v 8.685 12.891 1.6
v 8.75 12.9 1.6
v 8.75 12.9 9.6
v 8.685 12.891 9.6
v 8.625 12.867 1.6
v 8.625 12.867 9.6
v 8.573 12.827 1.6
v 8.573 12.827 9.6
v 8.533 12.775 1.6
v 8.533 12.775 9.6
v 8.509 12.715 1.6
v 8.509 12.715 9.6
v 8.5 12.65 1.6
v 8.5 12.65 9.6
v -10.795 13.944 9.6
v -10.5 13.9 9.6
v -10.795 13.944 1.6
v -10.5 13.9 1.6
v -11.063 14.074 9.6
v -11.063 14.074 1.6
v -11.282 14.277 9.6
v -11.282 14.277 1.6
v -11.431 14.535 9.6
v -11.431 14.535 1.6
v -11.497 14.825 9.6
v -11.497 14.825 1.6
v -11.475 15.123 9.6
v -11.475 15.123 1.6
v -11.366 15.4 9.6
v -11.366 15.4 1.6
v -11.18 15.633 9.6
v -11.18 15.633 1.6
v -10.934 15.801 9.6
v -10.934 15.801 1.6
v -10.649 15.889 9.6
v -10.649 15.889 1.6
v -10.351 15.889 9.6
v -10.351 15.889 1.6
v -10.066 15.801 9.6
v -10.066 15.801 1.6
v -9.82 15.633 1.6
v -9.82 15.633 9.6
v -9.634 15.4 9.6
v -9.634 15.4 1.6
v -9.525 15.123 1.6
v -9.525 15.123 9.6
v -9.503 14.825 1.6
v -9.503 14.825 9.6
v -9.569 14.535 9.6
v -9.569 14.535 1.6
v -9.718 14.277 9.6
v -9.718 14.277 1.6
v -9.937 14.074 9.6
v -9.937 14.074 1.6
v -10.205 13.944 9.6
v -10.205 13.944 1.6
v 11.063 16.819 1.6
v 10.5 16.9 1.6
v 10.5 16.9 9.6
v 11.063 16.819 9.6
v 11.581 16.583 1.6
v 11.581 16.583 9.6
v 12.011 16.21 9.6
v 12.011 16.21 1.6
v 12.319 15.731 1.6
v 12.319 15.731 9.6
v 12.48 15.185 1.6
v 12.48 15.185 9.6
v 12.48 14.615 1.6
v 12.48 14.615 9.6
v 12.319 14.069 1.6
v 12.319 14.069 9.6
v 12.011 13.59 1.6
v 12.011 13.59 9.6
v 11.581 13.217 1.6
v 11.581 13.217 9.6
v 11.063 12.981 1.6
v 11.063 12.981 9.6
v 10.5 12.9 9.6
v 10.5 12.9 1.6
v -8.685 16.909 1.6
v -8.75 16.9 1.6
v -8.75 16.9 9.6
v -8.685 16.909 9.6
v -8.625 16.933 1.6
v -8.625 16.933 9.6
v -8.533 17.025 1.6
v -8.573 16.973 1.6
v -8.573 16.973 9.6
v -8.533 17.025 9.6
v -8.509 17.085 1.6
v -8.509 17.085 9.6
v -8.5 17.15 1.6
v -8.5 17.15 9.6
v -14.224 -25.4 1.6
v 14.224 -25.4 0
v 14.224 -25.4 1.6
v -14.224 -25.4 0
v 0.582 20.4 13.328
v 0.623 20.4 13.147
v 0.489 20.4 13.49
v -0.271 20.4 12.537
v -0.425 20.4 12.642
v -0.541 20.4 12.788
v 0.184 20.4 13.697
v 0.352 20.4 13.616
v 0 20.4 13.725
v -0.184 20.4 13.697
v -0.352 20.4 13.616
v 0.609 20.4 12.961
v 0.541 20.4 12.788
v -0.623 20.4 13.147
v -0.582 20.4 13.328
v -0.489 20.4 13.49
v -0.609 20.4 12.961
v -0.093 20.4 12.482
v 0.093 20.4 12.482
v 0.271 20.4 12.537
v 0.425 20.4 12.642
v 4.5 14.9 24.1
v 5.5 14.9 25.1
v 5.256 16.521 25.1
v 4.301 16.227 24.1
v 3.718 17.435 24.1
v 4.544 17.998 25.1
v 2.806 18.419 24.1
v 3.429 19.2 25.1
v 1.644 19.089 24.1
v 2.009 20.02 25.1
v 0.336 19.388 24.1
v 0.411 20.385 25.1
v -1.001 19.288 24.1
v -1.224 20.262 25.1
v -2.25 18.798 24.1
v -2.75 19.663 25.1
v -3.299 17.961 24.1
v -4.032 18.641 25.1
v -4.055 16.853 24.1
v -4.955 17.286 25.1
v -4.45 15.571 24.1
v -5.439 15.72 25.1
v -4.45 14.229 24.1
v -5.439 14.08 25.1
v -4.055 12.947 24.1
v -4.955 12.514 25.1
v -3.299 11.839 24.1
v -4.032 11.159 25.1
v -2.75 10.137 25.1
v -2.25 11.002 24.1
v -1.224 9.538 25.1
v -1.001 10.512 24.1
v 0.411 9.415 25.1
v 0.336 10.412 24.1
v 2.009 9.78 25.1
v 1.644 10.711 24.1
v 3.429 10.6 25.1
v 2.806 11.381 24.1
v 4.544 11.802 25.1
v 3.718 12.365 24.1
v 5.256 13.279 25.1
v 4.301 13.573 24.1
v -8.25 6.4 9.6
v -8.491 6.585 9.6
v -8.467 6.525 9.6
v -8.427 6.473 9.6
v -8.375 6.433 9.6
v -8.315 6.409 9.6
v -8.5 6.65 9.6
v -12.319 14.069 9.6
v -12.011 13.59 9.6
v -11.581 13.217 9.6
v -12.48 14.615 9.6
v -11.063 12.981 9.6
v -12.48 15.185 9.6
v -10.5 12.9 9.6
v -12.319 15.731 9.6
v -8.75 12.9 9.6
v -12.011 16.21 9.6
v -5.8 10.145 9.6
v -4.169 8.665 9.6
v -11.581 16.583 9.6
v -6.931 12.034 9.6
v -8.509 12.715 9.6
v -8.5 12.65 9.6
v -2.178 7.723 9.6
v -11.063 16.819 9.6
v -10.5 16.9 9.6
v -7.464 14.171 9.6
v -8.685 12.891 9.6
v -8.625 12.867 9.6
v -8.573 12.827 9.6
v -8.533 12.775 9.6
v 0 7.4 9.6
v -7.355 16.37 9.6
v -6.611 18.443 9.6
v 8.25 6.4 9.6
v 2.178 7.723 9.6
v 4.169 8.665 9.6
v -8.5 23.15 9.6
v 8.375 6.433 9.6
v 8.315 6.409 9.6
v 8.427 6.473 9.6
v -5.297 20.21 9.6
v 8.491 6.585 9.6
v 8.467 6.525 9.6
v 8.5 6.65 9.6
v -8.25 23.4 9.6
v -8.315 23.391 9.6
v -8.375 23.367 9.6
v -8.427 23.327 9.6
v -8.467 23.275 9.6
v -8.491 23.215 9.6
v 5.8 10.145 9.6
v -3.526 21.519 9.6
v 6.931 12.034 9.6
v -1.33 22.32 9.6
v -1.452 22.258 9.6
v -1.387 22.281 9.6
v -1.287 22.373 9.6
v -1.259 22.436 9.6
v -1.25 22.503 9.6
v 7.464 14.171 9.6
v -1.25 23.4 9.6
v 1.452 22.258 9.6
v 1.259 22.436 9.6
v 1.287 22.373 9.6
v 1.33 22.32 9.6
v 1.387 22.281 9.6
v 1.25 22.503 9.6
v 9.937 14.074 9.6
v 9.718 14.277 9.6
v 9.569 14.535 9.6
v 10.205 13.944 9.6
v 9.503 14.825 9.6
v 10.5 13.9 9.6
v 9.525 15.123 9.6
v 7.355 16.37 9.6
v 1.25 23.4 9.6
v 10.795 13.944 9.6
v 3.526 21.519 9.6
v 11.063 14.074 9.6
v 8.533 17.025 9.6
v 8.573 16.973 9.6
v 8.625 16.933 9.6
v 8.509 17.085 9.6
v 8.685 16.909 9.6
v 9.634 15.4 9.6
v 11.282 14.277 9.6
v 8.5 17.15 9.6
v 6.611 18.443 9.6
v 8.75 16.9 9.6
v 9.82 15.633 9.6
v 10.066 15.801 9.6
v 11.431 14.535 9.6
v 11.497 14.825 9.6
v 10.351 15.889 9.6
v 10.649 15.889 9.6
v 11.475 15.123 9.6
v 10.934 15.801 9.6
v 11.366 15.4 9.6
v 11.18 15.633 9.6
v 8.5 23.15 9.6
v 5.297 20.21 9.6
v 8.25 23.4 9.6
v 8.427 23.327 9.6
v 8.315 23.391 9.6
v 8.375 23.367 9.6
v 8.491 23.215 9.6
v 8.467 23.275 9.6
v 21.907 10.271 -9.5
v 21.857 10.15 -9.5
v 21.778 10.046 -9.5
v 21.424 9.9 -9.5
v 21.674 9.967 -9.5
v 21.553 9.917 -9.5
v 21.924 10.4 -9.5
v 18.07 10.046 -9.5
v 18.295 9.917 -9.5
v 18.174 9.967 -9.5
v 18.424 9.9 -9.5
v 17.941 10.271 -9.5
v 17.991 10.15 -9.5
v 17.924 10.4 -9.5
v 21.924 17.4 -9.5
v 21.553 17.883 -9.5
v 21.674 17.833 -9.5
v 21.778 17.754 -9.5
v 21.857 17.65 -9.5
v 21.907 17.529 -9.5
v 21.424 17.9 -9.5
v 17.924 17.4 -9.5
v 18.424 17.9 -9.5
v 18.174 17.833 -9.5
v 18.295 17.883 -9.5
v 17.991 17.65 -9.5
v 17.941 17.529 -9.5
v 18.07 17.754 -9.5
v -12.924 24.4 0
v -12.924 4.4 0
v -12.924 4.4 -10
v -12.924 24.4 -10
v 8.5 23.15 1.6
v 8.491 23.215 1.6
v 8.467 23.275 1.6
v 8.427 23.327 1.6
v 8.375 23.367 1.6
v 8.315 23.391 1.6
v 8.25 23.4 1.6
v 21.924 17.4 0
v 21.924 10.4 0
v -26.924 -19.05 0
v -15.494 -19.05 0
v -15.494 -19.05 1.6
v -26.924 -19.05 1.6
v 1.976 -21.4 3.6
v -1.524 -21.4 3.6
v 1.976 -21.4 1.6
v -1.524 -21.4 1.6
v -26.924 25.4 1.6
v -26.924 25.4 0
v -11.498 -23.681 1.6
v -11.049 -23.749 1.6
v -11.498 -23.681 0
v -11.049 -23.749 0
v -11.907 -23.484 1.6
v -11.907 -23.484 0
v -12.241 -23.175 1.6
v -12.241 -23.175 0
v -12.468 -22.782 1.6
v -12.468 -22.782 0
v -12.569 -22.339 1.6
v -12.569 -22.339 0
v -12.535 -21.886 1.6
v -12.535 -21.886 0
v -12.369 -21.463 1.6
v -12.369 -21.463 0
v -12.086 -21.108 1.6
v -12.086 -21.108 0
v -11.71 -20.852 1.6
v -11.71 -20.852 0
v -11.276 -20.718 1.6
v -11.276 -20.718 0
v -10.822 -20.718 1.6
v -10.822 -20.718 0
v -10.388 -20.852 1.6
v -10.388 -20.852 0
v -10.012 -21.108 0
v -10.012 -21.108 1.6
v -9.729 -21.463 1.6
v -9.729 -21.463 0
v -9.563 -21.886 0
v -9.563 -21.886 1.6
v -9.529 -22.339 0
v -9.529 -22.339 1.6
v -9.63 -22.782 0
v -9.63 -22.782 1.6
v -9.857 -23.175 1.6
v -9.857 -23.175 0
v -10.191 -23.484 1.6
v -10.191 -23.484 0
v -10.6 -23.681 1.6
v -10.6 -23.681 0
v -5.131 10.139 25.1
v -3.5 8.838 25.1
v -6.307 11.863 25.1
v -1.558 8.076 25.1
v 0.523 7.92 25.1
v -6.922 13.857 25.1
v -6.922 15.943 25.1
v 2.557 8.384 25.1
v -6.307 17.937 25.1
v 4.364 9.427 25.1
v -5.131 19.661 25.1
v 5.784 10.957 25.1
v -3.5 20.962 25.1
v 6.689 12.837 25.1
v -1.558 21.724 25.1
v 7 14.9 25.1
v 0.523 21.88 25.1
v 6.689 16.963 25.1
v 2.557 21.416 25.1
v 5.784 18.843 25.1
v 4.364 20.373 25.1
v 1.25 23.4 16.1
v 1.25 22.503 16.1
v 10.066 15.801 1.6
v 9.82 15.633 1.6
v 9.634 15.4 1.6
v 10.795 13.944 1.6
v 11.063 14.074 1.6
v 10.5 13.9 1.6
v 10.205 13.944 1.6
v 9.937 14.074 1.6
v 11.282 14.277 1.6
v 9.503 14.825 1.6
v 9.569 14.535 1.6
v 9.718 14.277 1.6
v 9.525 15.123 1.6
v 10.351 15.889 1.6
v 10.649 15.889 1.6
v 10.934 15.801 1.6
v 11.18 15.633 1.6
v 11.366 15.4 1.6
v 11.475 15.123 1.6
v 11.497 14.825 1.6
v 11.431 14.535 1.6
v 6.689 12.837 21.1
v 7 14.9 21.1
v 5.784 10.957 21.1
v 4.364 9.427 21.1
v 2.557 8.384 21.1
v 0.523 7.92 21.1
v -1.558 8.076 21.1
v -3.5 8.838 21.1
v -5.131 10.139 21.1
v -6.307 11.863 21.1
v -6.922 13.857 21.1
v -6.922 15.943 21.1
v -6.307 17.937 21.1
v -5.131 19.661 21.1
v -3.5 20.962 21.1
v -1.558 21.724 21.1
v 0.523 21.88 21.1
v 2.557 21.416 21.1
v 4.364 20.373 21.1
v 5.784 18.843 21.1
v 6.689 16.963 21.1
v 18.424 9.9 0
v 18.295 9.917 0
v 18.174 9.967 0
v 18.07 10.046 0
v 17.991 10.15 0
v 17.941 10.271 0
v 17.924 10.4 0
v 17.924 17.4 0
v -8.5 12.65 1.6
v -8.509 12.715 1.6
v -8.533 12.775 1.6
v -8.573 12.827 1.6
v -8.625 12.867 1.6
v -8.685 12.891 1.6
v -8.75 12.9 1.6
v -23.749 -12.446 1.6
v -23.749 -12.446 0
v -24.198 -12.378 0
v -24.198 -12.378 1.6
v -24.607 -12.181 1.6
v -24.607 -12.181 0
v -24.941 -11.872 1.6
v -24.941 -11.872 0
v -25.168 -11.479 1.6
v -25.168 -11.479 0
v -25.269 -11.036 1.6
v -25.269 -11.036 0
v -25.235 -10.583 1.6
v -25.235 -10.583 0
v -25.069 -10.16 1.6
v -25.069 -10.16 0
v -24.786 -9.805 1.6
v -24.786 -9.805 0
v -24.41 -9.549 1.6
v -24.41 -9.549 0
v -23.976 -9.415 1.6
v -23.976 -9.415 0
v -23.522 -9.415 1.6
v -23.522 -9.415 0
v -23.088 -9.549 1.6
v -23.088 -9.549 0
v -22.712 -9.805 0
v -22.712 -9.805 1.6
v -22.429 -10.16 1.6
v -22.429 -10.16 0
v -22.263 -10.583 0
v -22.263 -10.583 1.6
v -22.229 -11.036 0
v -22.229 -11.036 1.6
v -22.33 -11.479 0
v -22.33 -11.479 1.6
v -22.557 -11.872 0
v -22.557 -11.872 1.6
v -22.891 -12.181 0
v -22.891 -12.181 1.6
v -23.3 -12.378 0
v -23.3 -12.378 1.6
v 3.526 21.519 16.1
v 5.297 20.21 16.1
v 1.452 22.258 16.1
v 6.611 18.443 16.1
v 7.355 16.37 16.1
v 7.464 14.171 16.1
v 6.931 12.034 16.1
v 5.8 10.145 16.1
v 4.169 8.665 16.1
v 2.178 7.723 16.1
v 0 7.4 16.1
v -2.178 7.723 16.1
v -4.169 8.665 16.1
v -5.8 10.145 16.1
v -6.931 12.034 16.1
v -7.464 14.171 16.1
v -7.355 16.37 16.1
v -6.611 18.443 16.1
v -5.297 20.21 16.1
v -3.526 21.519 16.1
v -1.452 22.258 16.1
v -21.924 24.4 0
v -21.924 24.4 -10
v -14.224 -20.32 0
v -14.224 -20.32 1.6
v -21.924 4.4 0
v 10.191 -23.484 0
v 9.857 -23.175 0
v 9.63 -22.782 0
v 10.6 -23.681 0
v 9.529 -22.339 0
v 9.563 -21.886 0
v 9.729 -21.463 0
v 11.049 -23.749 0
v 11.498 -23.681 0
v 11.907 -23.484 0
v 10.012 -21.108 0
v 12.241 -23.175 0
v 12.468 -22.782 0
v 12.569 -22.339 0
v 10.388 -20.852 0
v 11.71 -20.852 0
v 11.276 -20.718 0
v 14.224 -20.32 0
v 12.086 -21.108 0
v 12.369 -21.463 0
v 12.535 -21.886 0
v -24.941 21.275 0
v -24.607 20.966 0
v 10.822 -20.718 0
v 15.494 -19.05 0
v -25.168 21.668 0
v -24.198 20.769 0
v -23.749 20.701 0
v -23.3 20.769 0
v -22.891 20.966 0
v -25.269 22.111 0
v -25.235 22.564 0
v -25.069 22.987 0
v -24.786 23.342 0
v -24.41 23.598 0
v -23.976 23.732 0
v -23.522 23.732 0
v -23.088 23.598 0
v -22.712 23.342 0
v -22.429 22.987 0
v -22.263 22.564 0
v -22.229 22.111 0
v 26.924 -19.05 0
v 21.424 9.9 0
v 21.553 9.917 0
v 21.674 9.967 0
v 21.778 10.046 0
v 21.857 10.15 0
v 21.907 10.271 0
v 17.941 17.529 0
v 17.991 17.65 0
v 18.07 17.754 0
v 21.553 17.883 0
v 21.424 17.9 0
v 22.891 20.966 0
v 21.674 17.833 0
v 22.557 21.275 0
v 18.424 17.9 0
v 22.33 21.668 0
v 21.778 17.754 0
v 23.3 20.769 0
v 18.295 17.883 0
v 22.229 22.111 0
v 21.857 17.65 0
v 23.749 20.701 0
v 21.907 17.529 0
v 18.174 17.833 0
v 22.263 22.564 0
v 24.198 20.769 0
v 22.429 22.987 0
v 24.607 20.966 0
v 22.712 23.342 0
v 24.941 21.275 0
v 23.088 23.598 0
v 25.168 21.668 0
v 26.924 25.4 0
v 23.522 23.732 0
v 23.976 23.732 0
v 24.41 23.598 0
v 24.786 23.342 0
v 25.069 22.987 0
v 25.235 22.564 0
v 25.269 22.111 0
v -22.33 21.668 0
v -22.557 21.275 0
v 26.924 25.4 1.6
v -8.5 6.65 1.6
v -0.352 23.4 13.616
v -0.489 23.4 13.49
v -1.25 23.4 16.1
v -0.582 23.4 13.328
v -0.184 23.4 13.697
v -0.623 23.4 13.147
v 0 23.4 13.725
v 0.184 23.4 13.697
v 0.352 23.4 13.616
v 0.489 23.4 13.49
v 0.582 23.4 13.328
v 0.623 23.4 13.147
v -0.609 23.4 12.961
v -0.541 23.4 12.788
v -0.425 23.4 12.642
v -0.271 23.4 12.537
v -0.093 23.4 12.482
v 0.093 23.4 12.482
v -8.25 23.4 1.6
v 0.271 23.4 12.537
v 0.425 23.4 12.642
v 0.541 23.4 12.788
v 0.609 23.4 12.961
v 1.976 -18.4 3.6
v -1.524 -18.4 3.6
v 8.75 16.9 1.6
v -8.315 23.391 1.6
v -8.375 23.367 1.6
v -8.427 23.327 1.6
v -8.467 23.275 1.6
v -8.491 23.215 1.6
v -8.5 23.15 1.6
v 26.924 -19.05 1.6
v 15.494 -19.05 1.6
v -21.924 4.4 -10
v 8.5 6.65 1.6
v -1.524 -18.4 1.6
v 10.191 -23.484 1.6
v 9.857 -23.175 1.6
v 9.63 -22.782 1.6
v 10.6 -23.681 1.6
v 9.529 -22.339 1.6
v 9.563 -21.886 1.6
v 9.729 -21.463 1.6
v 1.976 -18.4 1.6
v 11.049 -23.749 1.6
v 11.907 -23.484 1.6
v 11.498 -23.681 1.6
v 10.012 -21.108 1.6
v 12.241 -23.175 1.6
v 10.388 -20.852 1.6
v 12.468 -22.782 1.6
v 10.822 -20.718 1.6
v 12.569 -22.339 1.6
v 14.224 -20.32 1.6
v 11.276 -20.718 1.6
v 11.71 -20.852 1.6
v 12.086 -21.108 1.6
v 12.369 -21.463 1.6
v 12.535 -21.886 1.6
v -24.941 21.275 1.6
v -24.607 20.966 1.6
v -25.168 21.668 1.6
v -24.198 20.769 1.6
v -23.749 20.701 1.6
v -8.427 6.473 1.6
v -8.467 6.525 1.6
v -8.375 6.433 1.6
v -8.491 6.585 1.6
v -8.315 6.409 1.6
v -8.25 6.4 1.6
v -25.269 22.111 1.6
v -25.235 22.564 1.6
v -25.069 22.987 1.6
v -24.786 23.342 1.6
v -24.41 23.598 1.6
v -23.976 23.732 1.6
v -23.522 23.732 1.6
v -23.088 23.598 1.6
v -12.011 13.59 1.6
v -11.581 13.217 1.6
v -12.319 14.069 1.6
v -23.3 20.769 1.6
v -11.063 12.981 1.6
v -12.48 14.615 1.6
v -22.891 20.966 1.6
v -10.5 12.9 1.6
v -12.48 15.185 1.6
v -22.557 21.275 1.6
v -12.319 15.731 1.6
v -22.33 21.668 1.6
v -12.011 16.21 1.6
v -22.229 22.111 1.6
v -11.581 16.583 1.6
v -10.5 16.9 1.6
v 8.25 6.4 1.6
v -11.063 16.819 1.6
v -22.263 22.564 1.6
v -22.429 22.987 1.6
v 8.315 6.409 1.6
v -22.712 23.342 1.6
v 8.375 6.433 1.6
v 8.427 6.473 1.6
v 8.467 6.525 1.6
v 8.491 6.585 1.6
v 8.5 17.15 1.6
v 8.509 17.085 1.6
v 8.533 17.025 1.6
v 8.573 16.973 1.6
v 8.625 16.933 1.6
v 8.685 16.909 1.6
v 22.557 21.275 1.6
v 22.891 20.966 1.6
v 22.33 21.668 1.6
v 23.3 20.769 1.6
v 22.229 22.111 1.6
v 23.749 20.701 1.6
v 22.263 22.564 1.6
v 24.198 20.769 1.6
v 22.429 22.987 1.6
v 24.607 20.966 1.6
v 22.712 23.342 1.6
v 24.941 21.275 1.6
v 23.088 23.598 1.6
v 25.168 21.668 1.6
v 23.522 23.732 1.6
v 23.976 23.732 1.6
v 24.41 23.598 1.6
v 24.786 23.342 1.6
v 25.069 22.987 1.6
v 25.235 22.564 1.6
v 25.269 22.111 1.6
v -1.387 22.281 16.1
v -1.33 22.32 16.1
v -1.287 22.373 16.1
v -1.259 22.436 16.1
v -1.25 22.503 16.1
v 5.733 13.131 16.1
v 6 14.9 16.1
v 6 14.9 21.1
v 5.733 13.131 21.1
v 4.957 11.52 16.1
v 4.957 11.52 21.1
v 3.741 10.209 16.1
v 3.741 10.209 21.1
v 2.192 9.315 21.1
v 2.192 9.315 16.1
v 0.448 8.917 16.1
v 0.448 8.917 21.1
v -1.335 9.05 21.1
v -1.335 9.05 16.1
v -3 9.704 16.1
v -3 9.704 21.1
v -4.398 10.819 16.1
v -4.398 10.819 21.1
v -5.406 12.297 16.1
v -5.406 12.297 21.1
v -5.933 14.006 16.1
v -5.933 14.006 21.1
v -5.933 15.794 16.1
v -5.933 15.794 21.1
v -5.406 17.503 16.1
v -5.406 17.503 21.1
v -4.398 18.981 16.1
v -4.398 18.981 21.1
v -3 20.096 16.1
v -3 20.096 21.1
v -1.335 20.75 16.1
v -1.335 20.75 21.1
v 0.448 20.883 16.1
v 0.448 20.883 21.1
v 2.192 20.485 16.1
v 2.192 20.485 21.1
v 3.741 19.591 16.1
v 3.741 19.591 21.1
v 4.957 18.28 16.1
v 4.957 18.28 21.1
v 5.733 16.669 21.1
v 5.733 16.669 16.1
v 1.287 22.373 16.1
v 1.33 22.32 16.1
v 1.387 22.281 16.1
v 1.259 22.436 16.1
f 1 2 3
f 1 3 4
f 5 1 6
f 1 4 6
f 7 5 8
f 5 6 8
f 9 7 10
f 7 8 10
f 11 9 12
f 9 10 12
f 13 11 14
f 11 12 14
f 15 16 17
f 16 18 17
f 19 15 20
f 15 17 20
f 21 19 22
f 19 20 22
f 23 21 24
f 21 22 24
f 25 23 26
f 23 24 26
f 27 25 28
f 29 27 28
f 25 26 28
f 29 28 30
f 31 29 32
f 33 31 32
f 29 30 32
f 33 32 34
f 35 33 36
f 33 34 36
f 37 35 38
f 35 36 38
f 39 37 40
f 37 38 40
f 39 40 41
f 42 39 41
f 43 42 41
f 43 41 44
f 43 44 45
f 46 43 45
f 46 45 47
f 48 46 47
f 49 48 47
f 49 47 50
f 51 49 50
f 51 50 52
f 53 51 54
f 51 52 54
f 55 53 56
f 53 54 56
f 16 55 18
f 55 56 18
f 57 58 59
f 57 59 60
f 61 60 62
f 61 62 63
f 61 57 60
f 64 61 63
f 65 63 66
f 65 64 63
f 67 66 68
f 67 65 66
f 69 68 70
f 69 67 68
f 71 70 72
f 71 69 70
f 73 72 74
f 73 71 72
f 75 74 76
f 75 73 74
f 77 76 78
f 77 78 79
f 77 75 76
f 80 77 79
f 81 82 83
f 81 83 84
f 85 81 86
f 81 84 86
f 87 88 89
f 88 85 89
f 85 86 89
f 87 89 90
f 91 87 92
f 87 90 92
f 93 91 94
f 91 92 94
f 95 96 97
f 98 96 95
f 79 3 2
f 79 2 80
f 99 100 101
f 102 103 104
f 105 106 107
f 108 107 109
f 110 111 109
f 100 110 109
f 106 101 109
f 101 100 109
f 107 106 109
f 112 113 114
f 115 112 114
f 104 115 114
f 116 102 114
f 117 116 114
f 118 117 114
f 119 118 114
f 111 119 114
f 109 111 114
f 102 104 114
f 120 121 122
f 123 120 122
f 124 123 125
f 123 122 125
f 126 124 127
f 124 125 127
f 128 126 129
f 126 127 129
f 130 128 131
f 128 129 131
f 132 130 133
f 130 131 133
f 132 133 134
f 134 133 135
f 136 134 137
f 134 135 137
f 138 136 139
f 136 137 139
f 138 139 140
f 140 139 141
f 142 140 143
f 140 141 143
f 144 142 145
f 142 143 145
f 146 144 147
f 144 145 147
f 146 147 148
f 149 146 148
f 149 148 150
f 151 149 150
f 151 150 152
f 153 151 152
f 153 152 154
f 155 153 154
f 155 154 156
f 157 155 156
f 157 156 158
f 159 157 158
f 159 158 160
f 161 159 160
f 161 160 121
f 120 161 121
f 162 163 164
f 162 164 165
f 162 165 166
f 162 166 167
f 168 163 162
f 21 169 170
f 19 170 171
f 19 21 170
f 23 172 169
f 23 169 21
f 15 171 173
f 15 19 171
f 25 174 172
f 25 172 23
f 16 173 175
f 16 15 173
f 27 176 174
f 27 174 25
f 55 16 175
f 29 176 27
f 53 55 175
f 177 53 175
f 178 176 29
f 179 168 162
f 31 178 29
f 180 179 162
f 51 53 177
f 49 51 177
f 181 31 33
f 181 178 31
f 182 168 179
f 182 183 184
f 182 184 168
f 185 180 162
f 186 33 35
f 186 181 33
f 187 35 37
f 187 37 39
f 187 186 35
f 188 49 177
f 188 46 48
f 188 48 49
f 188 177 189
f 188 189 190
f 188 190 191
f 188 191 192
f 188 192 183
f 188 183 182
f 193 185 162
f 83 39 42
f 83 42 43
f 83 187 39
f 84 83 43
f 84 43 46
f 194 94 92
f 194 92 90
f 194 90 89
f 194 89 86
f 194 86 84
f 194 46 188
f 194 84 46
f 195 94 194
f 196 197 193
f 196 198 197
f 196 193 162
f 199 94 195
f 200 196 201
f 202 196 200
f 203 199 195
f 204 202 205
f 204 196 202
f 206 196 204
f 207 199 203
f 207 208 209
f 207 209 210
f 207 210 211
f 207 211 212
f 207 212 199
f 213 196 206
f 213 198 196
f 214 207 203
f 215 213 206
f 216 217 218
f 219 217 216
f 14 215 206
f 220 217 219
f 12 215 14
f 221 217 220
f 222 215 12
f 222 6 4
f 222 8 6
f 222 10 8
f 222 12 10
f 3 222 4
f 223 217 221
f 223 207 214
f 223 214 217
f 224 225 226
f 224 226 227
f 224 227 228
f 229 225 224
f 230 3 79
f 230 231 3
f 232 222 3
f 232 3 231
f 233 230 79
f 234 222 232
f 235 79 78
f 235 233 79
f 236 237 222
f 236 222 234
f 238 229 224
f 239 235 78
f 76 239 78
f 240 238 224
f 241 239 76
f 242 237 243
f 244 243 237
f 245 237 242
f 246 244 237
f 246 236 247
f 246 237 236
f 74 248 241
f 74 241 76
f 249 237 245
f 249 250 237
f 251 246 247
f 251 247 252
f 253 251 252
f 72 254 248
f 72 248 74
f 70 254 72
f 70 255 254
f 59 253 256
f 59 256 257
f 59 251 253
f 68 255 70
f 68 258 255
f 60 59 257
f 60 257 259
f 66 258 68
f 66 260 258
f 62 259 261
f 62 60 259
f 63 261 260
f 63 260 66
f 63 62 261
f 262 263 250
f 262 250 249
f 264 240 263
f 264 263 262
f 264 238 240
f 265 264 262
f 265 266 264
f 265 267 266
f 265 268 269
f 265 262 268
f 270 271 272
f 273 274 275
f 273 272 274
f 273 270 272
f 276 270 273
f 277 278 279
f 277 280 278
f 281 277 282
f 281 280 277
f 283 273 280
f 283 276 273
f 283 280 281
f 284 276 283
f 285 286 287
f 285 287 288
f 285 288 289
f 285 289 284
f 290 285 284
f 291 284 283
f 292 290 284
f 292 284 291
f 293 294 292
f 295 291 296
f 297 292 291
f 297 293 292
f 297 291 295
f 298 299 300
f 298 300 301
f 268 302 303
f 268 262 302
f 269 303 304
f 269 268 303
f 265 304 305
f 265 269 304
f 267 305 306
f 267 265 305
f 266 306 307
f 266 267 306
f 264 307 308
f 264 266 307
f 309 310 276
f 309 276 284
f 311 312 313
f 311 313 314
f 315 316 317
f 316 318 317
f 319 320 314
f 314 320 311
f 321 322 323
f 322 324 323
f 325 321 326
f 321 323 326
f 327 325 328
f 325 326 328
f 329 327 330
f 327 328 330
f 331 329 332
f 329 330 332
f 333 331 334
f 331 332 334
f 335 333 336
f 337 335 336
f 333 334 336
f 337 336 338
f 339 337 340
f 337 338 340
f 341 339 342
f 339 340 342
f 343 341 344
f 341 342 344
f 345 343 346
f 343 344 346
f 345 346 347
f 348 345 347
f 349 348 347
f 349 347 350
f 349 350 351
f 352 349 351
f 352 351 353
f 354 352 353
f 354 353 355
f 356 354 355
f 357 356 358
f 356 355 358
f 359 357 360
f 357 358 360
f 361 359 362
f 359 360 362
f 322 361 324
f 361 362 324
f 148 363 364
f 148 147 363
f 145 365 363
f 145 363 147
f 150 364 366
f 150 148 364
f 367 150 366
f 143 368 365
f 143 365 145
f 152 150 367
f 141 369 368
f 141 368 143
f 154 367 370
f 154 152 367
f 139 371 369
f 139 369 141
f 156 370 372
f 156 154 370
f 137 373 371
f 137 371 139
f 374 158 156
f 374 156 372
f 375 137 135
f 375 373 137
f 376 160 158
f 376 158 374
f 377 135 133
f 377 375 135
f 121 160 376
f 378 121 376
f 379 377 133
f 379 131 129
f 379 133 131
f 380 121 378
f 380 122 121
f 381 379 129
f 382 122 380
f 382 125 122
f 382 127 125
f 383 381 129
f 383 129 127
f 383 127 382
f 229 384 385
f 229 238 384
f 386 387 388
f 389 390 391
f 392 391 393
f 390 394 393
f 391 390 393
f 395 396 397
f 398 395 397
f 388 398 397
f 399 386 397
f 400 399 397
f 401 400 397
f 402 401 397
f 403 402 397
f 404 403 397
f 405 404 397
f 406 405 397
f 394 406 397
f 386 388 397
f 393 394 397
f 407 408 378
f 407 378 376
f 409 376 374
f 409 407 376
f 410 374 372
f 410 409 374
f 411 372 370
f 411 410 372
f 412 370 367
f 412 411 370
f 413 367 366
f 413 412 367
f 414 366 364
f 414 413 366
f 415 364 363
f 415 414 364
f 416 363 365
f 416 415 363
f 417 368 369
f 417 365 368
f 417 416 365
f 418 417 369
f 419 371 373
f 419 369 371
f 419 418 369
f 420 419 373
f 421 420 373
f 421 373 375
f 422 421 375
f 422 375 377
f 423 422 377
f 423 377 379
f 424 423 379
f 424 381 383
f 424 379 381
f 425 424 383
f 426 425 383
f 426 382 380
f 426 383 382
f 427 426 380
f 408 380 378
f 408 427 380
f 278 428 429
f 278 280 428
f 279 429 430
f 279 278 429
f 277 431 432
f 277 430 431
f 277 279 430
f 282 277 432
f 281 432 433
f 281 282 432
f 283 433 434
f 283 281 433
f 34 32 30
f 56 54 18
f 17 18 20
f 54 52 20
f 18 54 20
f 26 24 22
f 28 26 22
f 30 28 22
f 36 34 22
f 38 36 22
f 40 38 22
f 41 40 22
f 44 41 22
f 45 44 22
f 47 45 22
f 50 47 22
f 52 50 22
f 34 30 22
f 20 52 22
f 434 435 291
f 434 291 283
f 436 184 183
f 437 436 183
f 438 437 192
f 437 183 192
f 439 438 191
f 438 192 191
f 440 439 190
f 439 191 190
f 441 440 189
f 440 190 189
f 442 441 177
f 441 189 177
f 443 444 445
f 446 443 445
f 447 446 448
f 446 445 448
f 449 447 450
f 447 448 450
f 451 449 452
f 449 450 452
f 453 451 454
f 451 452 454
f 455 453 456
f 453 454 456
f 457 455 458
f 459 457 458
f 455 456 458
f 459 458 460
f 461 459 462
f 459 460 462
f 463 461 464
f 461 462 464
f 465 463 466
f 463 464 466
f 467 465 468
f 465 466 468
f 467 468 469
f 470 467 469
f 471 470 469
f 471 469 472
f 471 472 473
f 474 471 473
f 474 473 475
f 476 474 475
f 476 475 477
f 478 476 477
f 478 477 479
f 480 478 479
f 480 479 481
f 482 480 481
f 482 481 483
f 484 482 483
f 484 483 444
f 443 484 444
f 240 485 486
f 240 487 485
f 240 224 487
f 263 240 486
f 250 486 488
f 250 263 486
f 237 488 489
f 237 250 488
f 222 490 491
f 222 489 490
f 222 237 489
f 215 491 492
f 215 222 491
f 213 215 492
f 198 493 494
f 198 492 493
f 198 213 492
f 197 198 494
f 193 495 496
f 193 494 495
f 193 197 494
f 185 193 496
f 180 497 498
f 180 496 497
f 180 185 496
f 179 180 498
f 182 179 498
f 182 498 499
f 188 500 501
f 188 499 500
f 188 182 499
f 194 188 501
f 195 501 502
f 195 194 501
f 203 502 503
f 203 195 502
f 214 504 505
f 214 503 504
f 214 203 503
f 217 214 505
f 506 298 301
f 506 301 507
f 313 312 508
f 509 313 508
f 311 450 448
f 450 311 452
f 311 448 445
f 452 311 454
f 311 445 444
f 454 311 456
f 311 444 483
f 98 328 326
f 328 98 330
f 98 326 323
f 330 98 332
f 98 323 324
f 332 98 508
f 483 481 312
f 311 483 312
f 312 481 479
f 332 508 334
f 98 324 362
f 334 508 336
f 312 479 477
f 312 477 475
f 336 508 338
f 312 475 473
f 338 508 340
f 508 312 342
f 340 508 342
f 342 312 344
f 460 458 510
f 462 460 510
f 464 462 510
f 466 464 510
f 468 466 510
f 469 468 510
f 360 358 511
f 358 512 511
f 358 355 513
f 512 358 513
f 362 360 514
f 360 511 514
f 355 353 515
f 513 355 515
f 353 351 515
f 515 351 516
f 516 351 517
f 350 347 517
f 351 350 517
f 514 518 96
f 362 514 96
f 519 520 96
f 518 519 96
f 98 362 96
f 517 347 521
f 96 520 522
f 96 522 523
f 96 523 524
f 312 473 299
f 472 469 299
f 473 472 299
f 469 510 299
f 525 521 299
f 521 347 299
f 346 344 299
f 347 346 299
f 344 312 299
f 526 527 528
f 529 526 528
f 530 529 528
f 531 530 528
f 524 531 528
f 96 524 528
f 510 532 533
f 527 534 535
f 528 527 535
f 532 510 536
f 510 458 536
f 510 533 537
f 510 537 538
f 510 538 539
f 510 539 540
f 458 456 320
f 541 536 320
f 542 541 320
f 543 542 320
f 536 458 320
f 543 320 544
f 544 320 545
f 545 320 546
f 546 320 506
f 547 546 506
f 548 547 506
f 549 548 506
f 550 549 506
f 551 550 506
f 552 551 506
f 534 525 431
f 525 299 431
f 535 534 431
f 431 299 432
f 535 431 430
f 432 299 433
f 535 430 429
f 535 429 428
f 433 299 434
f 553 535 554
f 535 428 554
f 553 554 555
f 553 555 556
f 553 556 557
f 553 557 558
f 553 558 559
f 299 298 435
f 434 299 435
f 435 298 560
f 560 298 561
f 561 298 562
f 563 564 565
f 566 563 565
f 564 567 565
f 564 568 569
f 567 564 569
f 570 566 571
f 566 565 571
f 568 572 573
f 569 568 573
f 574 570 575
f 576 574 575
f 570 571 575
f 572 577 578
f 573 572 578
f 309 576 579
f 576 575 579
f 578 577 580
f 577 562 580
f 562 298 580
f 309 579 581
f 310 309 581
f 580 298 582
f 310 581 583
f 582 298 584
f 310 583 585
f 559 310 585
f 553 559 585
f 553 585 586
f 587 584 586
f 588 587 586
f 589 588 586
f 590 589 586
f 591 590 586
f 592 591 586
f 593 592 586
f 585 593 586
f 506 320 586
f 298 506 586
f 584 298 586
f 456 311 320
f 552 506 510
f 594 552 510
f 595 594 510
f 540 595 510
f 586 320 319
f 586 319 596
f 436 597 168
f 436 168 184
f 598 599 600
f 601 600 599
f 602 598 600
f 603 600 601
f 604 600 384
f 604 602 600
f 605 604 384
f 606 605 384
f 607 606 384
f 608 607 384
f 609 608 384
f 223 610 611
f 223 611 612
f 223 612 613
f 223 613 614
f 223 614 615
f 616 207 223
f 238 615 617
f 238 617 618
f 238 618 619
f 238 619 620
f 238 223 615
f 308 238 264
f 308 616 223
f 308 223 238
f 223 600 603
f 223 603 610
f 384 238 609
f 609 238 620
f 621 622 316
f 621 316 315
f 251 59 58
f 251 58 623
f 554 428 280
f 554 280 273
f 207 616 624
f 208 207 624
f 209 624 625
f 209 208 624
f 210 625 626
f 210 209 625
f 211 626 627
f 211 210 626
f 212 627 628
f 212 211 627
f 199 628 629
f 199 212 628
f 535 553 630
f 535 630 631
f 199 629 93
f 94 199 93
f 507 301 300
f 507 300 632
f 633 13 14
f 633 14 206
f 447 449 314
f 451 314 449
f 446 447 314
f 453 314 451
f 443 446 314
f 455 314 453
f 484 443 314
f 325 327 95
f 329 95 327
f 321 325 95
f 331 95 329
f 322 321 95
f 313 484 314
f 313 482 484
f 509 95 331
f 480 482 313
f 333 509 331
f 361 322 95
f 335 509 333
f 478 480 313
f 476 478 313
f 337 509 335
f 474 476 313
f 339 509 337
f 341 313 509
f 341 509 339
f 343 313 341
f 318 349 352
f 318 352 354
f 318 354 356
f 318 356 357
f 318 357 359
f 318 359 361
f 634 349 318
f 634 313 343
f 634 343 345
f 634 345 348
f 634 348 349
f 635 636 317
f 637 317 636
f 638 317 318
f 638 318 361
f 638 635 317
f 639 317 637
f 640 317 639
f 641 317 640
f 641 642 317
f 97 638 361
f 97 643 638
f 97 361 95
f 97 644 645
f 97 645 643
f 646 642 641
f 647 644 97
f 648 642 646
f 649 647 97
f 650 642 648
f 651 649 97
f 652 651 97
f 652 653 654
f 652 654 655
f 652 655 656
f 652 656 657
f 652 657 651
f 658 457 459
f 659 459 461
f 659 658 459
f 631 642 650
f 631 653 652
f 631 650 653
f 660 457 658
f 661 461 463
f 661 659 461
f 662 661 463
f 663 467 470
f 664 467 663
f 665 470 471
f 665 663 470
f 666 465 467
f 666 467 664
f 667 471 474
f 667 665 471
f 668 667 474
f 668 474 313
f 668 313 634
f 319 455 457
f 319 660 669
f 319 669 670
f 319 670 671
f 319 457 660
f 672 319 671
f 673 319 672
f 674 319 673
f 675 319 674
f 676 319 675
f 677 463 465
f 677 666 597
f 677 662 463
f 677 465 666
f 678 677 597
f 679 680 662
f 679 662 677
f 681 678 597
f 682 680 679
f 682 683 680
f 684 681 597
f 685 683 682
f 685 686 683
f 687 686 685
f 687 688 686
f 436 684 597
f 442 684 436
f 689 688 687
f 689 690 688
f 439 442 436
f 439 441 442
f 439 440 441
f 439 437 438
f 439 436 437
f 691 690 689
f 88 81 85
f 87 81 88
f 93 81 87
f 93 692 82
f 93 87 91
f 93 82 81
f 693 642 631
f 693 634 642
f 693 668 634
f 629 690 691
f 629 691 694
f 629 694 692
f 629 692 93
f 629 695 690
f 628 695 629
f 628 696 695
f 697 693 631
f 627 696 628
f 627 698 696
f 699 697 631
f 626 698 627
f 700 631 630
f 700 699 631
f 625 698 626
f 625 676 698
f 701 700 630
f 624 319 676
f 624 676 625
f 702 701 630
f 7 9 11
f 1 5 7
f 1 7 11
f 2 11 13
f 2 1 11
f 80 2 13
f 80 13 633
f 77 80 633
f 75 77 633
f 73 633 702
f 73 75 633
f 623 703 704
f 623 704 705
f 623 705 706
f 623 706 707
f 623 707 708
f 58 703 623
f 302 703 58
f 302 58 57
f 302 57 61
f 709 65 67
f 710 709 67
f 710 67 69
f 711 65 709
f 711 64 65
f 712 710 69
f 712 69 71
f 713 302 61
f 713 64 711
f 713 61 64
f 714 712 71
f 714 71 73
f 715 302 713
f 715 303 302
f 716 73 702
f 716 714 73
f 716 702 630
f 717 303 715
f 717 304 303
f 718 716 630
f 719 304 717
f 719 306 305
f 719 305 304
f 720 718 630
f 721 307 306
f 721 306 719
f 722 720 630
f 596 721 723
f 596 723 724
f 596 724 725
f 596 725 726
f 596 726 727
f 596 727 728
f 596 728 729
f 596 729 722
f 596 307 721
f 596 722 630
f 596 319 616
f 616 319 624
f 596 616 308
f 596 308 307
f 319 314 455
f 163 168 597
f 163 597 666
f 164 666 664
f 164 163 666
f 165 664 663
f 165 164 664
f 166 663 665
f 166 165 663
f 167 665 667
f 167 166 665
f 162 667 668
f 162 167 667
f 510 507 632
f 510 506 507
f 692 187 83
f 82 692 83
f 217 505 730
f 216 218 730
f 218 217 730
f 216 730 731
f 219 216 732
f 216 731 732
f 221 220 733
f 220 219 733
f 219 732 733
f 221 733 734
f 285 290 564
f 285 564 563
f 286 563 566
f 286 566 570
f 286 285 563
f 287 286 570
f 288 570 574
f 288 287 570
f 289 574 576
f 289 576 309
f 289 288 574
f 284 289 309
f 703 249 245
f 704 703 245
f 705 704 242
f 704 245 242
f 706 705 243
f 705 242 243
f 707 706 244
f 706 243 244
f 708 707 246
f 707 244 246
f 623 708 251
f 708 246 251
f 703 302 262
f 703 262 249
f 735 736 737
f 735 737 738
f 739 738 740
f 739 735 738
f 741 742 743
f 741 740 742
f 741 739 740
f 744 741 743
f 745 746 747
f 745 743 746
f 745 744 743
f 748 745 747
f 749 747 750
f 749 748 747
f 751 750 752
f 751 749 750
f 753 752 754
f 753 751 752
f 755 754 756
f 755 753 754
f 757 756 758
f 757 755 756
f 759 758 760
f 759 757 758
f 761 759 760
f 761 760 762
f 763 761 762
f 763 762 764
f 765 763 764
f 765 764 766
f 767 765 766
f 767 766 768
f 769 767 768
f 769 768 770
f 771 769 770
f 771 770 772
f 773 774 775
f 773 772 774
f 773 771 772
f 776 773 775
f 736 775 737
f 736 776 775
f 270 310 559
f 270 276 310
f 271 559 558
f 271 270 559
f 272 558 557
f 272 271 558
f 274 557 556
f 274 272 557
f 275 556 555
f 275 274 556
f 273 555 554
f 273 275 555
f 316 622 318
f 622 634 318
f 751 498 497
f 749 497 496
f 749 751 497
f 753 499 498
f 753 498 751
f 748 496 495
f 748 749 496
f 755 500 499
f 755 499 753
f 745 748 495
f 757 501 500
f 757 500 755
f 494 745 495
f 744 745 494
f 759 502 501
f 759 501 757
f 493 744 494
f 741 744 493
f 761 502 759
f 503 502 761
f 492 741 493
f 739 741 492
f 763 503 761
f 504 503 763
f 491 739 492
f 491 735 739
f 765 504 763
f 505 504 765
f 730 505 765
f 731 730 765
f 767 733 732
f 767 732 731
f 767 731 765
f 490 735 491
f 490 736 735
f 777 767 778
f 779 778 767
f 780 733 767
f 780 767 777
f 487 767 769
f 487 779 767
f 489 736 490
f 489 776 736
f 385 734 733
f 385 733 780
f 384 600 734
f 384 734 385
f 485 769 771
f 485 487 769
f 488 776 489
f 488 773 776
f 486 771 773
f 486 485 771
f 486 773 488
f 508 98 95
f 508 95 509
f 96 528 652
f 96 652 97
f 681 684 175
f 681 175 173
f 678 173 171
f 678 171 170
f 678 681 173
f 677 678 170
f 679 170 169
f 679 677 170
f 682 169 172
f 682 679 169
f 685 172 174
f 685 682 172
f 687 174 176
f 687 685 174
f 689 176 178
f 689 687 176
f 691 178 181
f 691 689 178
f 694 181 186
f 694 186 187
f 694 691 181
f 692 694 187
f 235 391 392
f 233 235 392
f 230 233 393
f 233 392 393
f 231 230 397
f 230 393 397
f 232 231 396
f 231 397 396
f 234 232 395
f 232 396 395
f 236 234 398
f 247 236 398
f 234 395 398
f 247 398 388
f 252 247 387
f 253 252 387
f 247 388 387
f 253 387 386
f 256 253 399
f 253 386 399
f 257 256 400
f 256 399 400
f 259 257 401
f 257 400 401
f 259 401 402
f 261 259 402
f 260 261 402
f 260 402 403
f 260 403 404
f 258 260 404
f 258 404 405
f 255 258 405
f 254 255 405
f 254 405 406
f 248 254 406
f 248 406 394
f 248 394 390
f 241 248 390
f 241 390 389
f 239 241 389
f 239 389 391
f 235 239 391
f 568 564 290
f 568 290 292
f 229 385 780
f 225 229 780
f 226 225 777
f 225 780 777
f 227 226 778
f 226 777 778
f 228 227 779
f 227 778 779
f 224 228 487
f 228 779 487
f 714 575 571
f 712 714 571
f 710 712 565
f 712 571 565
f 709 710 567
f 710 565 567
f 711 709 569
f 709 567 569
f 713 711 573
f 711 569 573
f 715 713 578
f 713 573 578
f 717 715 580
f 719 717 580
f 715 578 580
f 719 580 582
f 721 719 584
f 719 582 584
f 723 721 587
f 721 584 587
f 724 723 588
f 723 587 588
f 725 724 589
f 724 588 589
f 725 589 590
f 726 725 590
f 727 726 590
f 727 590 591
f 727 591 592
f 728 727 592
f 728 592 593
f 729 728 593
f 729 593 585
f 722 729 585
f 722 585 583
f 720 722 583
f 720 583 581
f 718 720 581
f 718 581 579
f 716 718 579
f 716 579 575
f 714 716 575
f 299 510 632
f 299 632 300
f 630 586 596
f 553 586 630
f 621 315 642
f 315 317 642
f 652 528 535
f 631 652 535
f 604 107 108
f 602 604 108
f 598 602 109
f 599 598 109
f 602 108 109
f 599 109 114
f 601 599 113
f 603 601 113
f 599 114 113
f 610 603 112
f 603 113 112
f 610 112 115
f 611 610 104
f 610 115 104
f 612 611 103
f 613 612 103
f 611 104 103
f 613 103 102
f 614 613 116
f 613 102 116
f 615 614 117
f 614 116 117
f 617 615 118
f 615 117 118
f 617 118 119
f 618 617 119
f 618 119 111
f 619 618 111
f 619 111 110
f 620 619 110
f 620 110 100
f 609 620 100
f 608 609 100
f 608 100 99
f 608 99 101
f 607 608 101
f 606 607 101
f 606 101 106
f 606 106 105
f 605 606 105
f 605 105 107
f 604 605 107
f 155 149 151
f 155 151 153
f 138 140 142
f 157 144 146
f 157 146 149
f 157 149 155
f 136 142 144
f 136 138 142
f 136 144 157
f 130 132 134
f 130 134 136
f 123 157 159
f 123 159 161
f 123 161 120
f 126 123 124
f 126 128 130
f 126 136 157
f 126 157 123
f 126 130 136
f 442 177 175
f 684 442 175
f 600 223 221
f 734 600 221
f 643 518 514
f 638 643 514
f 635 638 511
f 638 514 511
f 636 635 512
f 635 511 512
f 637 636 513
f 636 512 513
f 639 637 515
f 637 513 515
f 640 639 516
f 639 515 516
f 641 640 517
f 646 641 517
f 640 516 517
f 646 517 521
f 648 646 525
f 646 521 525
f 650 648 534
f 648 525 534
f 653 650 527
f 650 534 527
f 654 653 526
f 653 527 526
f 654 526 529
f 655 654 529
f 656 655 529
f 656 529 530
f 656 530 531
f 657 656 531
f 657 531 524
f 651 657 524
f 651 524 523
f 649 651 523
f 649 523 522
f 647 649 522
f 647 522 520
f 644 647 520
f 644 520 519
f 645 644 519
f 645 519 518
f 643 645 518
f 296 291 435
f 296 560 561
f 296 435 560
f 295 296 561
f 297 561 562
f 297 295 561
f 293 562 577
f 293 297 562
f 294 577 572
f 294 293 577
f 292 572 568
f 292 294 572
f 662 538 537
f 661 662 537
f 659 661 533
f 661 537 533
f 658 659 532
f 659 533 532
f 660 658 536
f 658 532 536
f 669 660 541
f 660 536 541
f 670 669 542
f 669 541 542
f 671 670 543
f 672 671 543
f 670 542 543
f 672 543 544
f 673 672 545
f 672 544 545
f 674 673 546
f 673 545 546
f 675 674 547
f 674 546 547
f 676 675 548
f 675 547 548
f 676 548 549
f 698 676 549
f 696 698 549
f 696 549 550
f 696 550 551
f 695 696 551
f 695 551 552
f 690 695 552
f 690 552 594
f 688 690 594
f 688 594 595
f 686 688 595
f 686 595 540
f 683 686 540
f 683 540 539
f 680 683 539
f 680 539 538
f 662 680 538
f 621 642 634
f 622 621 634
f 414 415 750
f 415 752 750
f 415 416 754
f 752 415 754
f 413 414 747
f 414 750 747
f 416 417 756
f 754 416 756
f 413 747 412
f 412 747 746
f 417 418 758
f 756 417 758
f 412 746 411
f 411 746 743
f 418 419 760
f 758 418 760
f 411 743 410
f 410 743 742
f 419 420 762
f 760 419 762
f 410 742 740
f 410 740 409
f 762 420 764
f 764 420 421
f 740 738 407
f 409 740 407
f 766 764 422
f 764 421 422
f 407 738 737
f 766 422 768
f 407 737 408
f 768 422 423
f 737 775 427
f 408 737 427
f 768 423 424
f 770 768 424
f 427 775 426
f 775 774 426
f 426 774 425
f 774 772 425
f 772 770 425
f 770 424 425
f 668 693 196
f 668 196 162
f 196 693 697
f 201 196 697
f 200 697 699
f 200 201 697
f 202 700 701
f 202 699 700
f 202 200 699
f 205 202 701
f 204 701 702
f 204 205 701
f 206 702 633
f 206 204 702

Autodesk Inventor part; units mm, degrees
ref_plane "YZ Plane" through (0, 0, 0) normal (1, 0, 0) x (0, 1, 0)
ref_plane "XZ Plane" through (0, 0, 0) normal (0, 1, 0) x (-1, 0, 0)
ref_plane "XY Plane" through (0, 0, 0) normal (0, 0, 1) x (1, 0, 0)
sketch "Sketch1" plane through (0, 0, 0) normal (0, 0, 1) x (1, 0, 0)
  line L0 (-26.924, 25.4) -> (26.924, 25.4)
  line L1 (-26.924, 25.4) -> (-26.924, -19.05)
  line L2 (-14.224, -25.4) -> (-14.224, -20.32)
  line L3 (-15.494, -19.05) -> (-26.924, -19.05)
  line L4 (26.924, 25.4) -> (26.924, -19.05)
  line L5 (26.924, -19.05) -> (15.494, -19.05)
  line L6 (14.224, -20.32) -> (14.224, -25.4)
  line L7 (14.224, -25.4) -> (-14.224, -25.4)
  line L8 (-15.494, -19.05) -> (-14.224, -20.32)
  line L9 (14.224, -20.32) -> (15.494, -19.05)
  point P0 (0, 0)
  point P1 (-14.224, -19.05)
  point P2 (14.224, -19.05)
  dimension "d7" = 1.27
  dimension "d8" = 1.27
  dimension "d9" = 1.27
  dimension "d10" = 1.27
extrude "Extrusion1" add sketch "Sketch1" along normal blind 1.6
sketch "Sketch2" plane through (0, 0, 1.6) normal (0, 0, 1) x (1, 0, 0)
  line L0 (26.924, 25.4) -> (-26.924, 25.4) projected
  line L1 (-26.924, 25.4) -> (-26.924, 22.225)
  line L2 (-26.924, 25.4) -> (-26.924, -19.05) projected
  line L3 (-26.924, 22.225) -> (-23.749, 22.225)
  line L4 (26.924, 22.225) -> (23.749, 22.225)
  line L5 (14.224, -25.4) -> (-14.224, -25.4) projected
  line L6 (-14.224, -25.4) -> (-11.049, -25.4)
  line L7 (-11.049, -25.4) -> (-11.049, -22.225)
  line L8 (14.224, -25.4) -> (11.049, -25.4)
  line L9 (11.049, -25.4) -> (11.049, -22.225)
  line L10 (-26.924, -19.05) -> (-26.924, -10.922)
  line L11 (-26.924, -10.922) -> (-23.749, -10.922)
  point P0 (0, 0)
  dimension "d13" = 3.175
  dimension "d14" = 3.175
  dimension "d15" = 3.175
  dimension "d16" = 3.175
  dimension "d17" = 3.175
  dimension "d18" = 3.175
  dimension "d19" = 8.128
  dimension "d20" = 3.175
hole "Hole1" at (-23.749, 22.225, 1.6) at (23.749, 22.225, 1.6) at (-11.049, -22.225, 1.6) at (11.049, -22.225, 1.6) at (-23.749, -10.922, 1.6) direction (0, 0, -1) diameter 3.048 end through all
sketch "Sketch3" plane through (0, 0, 1.6) normal (0, 0, 1) x (1, 0, 0)
  line L0 (-26.924, 25.4) -> (26.924, 25.4) projected
  line L1 (0, 23.4) -> (8.5, 23.4)
  line L2 (8.5, 23.4) -> (8.5, 16.9)
  line L3 (8.5, 6.4) -> (-8.5, 6.4)
  line L4 (-8.5, 6.4) -> (-8.5, 12.9)
  line L5 (-8.5, 23.4) -> (0, 23.4)
  line L6 (-8.5, 23.4) -> (-8.5, 16.9)
  line L7 (-8.5, 12.9) -> (-10.5, 12.9)
  line L8 (-12.5, 14.9) -> (-12.5, 14.9)
  line L9 (-10.5, 16.9) -> (-8.5, 16.9)
  line L10 (-8.5, 16.9) -> (-8.5, 23.4)
  line L11 (8.5, 12.9) -> (10.5, 12.9)
  line L12 (12.5, 14.9) -> (12.5, 14.9)
  line L13 (10.5, 16.9) -> (8.5, 16.9)
  line L14 (8.5, 12.9) -> (8.5, 6.4)
  arc A0 (-10.5, 16.9) -> (-12.5, 14.9) centre (-10.5, 14.9) ccw
  arc A1 (-12.5, 14.9) -> (-10.5, 12.9) centre (-10.5, 14.9) ccw
  arc A2 (10.5, 12.9) -> (12.5, 14.9) centre (10.5, 14.9) ccw
  arc A3 (12.5, 14.9) -> (10.5, 16.9) centre (10.5, 14.9) ccw
  point P0 (0, 0)
  dimension "d35" = 2
extrude "Extrusion2" add sketch "Sketch3" along normal blind 8
sketch "Sketch4" plane through (0, 0, 9.6) normal (0, 0, 1) x (1, 0, 0)
  circle A0 centre (0, 14.9) radius 7.5
  point P0 (0, 0)
  dimension "d38" = 15
extrude "Extrusion3" add sketch "Sketch4" along normal blind 6.5
sketch "Sketch5" plane through (0, 14.9, 16.1) normal (0, 0, 1) x (1, 0, 0)
  circle A0 centre (0, 0) radius 6
  point P0 (0, -14.9)
  dimension "d41" = 12
extrude "Extrusion4" add sketch "Sketch5" along normal blind 5
sketch "Sketch6" plane through (0, 14.9, 21.1) normal (0, 0, 1) x (1, 0, 0)
  circle A0 centre (0, 0) radius 7
  point P0 (0, -14.9)
  dimension "d44" = 14
extrude "Extrusion5" add sketch "Sketch6" along normal blind 4
sketch "Sketch7" plane through (0, 14.9, 25.1) normal (0, 0, 1) x (1, 0, 0)
  circle A0 centre (0, 0) radius 5.5
  point P0 (0, -14.9)
  dimension "d47" = 11
extrude "Extrusion6" cut sketch "Sketch7" against normal blind 1
chamfer "Chamfer1" distance 1 angle 45 1 edges at (-5.5, 14.9, 24.1)
sketch "Sketch8" plane through (0, 0, 9.6) normal (0, 0, 1) x (1, 0, 0)
  line L0 (-8.5, 23.4) -> (8.5, 23.4) projected
  line L1 (0, 23.4) -> (1.25, 23.4)
  line L2 (1.25, 23.4) -> (1.25, 22.2951)
  line L3 (0, 23.4) -> (-1.25, 23.4)
  line L4 (-1.25, 23.4) -> (-1.25, 22.2951)
  arc A0 (-1.25, 22.2951) -> (1.25, 22.2951) centre (0, 14.9) ccw
  arc A1 (1.25, 22.2951) -> (-1.25, 22.2951) centre (0, 14.9) ccw
  point P0 (0, 0)
  dimension "d53" = 1.25
  dimension "d54" = 1.25
extrude "Extrusion7" add sketch "Sketch8" along normal up to surface (6.5 mm away) contours L0 L2 A1 L4
sketch "Sketch9" plane through (-8.5, 23.4, 1.6) normal (0, 1, 0) x (1, 0, 0)
  line L0 (7.25, -14.5) -> (9.75, -14.5) projected
  line L1 (8.5, -14.5) -> (8.5, -11.5)
  point P0 (8.5, 1.6)
  dimension "d57" = 3
hole "Hole2" at (0, 23.4, 13.1) direction (0, -1, 0) diameter 1.25 depth 3
sketch "Sketch10" plane through (0, 0, 9.6) normal (0, 0, 1) x (1, 0, 0)
  arc A0 (-10.5, 16.9) -> (-10.5, 12.9) centre (-10.5, 14.9) ccw projected
  arc A1 (10.5, 12.9) -> (10.5, 16.9) centre (10.5, 14.9) ccw projected
  point P0 (0, 0)
hole "Hole3" at (-10.5, 14.9, 9.6) at (10.5, 14.9, 9.6) direction (0, 0, -1) diameter 2 depth 8
sketch "Sketch11" plane through (0, 0, 0) normal (0, 0, -1) x (-1, 0, 0)
  line L0 (26.924, 25.4) -> (26.924, -19.05) projected
  line L1 (26.924, 25.4) -> (26.924, 24.4)
  line L2 (26.924, 24.4) -> (21.924, 24.4)
  line L3 (21.924, 24.4) -> (21.924, 4.4)
  line L4 (21.924, 4.4) -> (12.924, 4.4)
  line L5 (12.924, 4.4) -> (12.924, 24.4)
  line L6 (12.924, 24.4) -> (21.924, 24.4)
  point P0 (0, 0)
  dimension "d72" = 1
  dimension "d73" = 5
  dimension "d74" = 20
  dimension "d75" = 9
extrude "Extrusion8" add sketch "Sketch11" along normal blind 10
sketch "Sketch13" plane through (0, 0, 0) normal (0, 0, -1) x (-1, 0, 0)
  line L0 (-26.924, 25.4) -> (26.924, 25.4) projected
  line L1 (-26.924, 25.4) -> (-21.924, 25.4)
  line L2 (-21.924, 25.4) -> (-21.924, 17.9)
  line L3 (-21.924, 17.9) -> (-17.924, 17.9)
  line L4 (-17.924, 17.9) -> (-17.924, 9.9)
  line L5 (-17.924, 9.9) -> (-21.924, 9.9)
  line L6 (-21.924, 9.9) -> (-21.924, 17.9)
  point P0 (0, 0)
  dimension "d78" = 5
  dimension "d79" = 7.5
  dimension "d80" = 4
  dimension "d81" = 8
extrude "Extrusion9" add sketch "Sketch13" along normal blind 9.5
fillet "Fillet1" radius 0.5 4 edges at (21.924, 17.9, -4.75) (21.924, 9.9, -4.75) (17.924, 9.9, -4.75) (17.924, 17.9, -4.75)
sketch "Sketch14" plane through (0, 0, 1.6) normal (0, 0, 1) x (1, 0, 0)
  line L0 (-14.224, -25.4) -> (-14.224, -20.32) projected
  line L1 (-14.224, -25.4) -> (-1.524, -25.4)
  line L2 (14.224, -25.4) -> (-14.224, -25.4) projected
  line L3 (-1.524, -25.4) -> (-1.524, -21.4)
  line L4 (-1.524, -21.4) -> (1.976, -21.4)
  line L5 (1.976, -21.4) -> (1.976, -18.4)
  line L6 (1.976, -18.4) -> (-1.524, -18.4)
  line L7 (-1.524, -18.4) -> (-1.524, -21.4)
  point P0 (0, 0)
  dimension "d85" = 12.7
  dimension "d86" = 4
  dimension "d87" = 3.5
  dimension "d88" = 3
extrude "Extrusion10" add sketch "Sketch14" along normal blind 2
fillet "Fillet2" radius 0.25 10 edges at (1.25, 22.2951, 12.85) (-1.25, 22.2951, 12.85) (8.5, 23.4, 5.6) (8.5, 16.9, 5.6) (8.5, 6.4, 5.6) (-8.5, 23.4, 5.6) (-8.5, 16.9, 5.6) (-8.5, 12.9, 5.6) (8.5, 12.9, 5.6) (-8.5, 6.4, 5.6)
equation "\"d8\" = d7"
equation "\"d9\" = d7"
equation "\"d10\" = d9"
properties part number "PixyCMUcam5"
